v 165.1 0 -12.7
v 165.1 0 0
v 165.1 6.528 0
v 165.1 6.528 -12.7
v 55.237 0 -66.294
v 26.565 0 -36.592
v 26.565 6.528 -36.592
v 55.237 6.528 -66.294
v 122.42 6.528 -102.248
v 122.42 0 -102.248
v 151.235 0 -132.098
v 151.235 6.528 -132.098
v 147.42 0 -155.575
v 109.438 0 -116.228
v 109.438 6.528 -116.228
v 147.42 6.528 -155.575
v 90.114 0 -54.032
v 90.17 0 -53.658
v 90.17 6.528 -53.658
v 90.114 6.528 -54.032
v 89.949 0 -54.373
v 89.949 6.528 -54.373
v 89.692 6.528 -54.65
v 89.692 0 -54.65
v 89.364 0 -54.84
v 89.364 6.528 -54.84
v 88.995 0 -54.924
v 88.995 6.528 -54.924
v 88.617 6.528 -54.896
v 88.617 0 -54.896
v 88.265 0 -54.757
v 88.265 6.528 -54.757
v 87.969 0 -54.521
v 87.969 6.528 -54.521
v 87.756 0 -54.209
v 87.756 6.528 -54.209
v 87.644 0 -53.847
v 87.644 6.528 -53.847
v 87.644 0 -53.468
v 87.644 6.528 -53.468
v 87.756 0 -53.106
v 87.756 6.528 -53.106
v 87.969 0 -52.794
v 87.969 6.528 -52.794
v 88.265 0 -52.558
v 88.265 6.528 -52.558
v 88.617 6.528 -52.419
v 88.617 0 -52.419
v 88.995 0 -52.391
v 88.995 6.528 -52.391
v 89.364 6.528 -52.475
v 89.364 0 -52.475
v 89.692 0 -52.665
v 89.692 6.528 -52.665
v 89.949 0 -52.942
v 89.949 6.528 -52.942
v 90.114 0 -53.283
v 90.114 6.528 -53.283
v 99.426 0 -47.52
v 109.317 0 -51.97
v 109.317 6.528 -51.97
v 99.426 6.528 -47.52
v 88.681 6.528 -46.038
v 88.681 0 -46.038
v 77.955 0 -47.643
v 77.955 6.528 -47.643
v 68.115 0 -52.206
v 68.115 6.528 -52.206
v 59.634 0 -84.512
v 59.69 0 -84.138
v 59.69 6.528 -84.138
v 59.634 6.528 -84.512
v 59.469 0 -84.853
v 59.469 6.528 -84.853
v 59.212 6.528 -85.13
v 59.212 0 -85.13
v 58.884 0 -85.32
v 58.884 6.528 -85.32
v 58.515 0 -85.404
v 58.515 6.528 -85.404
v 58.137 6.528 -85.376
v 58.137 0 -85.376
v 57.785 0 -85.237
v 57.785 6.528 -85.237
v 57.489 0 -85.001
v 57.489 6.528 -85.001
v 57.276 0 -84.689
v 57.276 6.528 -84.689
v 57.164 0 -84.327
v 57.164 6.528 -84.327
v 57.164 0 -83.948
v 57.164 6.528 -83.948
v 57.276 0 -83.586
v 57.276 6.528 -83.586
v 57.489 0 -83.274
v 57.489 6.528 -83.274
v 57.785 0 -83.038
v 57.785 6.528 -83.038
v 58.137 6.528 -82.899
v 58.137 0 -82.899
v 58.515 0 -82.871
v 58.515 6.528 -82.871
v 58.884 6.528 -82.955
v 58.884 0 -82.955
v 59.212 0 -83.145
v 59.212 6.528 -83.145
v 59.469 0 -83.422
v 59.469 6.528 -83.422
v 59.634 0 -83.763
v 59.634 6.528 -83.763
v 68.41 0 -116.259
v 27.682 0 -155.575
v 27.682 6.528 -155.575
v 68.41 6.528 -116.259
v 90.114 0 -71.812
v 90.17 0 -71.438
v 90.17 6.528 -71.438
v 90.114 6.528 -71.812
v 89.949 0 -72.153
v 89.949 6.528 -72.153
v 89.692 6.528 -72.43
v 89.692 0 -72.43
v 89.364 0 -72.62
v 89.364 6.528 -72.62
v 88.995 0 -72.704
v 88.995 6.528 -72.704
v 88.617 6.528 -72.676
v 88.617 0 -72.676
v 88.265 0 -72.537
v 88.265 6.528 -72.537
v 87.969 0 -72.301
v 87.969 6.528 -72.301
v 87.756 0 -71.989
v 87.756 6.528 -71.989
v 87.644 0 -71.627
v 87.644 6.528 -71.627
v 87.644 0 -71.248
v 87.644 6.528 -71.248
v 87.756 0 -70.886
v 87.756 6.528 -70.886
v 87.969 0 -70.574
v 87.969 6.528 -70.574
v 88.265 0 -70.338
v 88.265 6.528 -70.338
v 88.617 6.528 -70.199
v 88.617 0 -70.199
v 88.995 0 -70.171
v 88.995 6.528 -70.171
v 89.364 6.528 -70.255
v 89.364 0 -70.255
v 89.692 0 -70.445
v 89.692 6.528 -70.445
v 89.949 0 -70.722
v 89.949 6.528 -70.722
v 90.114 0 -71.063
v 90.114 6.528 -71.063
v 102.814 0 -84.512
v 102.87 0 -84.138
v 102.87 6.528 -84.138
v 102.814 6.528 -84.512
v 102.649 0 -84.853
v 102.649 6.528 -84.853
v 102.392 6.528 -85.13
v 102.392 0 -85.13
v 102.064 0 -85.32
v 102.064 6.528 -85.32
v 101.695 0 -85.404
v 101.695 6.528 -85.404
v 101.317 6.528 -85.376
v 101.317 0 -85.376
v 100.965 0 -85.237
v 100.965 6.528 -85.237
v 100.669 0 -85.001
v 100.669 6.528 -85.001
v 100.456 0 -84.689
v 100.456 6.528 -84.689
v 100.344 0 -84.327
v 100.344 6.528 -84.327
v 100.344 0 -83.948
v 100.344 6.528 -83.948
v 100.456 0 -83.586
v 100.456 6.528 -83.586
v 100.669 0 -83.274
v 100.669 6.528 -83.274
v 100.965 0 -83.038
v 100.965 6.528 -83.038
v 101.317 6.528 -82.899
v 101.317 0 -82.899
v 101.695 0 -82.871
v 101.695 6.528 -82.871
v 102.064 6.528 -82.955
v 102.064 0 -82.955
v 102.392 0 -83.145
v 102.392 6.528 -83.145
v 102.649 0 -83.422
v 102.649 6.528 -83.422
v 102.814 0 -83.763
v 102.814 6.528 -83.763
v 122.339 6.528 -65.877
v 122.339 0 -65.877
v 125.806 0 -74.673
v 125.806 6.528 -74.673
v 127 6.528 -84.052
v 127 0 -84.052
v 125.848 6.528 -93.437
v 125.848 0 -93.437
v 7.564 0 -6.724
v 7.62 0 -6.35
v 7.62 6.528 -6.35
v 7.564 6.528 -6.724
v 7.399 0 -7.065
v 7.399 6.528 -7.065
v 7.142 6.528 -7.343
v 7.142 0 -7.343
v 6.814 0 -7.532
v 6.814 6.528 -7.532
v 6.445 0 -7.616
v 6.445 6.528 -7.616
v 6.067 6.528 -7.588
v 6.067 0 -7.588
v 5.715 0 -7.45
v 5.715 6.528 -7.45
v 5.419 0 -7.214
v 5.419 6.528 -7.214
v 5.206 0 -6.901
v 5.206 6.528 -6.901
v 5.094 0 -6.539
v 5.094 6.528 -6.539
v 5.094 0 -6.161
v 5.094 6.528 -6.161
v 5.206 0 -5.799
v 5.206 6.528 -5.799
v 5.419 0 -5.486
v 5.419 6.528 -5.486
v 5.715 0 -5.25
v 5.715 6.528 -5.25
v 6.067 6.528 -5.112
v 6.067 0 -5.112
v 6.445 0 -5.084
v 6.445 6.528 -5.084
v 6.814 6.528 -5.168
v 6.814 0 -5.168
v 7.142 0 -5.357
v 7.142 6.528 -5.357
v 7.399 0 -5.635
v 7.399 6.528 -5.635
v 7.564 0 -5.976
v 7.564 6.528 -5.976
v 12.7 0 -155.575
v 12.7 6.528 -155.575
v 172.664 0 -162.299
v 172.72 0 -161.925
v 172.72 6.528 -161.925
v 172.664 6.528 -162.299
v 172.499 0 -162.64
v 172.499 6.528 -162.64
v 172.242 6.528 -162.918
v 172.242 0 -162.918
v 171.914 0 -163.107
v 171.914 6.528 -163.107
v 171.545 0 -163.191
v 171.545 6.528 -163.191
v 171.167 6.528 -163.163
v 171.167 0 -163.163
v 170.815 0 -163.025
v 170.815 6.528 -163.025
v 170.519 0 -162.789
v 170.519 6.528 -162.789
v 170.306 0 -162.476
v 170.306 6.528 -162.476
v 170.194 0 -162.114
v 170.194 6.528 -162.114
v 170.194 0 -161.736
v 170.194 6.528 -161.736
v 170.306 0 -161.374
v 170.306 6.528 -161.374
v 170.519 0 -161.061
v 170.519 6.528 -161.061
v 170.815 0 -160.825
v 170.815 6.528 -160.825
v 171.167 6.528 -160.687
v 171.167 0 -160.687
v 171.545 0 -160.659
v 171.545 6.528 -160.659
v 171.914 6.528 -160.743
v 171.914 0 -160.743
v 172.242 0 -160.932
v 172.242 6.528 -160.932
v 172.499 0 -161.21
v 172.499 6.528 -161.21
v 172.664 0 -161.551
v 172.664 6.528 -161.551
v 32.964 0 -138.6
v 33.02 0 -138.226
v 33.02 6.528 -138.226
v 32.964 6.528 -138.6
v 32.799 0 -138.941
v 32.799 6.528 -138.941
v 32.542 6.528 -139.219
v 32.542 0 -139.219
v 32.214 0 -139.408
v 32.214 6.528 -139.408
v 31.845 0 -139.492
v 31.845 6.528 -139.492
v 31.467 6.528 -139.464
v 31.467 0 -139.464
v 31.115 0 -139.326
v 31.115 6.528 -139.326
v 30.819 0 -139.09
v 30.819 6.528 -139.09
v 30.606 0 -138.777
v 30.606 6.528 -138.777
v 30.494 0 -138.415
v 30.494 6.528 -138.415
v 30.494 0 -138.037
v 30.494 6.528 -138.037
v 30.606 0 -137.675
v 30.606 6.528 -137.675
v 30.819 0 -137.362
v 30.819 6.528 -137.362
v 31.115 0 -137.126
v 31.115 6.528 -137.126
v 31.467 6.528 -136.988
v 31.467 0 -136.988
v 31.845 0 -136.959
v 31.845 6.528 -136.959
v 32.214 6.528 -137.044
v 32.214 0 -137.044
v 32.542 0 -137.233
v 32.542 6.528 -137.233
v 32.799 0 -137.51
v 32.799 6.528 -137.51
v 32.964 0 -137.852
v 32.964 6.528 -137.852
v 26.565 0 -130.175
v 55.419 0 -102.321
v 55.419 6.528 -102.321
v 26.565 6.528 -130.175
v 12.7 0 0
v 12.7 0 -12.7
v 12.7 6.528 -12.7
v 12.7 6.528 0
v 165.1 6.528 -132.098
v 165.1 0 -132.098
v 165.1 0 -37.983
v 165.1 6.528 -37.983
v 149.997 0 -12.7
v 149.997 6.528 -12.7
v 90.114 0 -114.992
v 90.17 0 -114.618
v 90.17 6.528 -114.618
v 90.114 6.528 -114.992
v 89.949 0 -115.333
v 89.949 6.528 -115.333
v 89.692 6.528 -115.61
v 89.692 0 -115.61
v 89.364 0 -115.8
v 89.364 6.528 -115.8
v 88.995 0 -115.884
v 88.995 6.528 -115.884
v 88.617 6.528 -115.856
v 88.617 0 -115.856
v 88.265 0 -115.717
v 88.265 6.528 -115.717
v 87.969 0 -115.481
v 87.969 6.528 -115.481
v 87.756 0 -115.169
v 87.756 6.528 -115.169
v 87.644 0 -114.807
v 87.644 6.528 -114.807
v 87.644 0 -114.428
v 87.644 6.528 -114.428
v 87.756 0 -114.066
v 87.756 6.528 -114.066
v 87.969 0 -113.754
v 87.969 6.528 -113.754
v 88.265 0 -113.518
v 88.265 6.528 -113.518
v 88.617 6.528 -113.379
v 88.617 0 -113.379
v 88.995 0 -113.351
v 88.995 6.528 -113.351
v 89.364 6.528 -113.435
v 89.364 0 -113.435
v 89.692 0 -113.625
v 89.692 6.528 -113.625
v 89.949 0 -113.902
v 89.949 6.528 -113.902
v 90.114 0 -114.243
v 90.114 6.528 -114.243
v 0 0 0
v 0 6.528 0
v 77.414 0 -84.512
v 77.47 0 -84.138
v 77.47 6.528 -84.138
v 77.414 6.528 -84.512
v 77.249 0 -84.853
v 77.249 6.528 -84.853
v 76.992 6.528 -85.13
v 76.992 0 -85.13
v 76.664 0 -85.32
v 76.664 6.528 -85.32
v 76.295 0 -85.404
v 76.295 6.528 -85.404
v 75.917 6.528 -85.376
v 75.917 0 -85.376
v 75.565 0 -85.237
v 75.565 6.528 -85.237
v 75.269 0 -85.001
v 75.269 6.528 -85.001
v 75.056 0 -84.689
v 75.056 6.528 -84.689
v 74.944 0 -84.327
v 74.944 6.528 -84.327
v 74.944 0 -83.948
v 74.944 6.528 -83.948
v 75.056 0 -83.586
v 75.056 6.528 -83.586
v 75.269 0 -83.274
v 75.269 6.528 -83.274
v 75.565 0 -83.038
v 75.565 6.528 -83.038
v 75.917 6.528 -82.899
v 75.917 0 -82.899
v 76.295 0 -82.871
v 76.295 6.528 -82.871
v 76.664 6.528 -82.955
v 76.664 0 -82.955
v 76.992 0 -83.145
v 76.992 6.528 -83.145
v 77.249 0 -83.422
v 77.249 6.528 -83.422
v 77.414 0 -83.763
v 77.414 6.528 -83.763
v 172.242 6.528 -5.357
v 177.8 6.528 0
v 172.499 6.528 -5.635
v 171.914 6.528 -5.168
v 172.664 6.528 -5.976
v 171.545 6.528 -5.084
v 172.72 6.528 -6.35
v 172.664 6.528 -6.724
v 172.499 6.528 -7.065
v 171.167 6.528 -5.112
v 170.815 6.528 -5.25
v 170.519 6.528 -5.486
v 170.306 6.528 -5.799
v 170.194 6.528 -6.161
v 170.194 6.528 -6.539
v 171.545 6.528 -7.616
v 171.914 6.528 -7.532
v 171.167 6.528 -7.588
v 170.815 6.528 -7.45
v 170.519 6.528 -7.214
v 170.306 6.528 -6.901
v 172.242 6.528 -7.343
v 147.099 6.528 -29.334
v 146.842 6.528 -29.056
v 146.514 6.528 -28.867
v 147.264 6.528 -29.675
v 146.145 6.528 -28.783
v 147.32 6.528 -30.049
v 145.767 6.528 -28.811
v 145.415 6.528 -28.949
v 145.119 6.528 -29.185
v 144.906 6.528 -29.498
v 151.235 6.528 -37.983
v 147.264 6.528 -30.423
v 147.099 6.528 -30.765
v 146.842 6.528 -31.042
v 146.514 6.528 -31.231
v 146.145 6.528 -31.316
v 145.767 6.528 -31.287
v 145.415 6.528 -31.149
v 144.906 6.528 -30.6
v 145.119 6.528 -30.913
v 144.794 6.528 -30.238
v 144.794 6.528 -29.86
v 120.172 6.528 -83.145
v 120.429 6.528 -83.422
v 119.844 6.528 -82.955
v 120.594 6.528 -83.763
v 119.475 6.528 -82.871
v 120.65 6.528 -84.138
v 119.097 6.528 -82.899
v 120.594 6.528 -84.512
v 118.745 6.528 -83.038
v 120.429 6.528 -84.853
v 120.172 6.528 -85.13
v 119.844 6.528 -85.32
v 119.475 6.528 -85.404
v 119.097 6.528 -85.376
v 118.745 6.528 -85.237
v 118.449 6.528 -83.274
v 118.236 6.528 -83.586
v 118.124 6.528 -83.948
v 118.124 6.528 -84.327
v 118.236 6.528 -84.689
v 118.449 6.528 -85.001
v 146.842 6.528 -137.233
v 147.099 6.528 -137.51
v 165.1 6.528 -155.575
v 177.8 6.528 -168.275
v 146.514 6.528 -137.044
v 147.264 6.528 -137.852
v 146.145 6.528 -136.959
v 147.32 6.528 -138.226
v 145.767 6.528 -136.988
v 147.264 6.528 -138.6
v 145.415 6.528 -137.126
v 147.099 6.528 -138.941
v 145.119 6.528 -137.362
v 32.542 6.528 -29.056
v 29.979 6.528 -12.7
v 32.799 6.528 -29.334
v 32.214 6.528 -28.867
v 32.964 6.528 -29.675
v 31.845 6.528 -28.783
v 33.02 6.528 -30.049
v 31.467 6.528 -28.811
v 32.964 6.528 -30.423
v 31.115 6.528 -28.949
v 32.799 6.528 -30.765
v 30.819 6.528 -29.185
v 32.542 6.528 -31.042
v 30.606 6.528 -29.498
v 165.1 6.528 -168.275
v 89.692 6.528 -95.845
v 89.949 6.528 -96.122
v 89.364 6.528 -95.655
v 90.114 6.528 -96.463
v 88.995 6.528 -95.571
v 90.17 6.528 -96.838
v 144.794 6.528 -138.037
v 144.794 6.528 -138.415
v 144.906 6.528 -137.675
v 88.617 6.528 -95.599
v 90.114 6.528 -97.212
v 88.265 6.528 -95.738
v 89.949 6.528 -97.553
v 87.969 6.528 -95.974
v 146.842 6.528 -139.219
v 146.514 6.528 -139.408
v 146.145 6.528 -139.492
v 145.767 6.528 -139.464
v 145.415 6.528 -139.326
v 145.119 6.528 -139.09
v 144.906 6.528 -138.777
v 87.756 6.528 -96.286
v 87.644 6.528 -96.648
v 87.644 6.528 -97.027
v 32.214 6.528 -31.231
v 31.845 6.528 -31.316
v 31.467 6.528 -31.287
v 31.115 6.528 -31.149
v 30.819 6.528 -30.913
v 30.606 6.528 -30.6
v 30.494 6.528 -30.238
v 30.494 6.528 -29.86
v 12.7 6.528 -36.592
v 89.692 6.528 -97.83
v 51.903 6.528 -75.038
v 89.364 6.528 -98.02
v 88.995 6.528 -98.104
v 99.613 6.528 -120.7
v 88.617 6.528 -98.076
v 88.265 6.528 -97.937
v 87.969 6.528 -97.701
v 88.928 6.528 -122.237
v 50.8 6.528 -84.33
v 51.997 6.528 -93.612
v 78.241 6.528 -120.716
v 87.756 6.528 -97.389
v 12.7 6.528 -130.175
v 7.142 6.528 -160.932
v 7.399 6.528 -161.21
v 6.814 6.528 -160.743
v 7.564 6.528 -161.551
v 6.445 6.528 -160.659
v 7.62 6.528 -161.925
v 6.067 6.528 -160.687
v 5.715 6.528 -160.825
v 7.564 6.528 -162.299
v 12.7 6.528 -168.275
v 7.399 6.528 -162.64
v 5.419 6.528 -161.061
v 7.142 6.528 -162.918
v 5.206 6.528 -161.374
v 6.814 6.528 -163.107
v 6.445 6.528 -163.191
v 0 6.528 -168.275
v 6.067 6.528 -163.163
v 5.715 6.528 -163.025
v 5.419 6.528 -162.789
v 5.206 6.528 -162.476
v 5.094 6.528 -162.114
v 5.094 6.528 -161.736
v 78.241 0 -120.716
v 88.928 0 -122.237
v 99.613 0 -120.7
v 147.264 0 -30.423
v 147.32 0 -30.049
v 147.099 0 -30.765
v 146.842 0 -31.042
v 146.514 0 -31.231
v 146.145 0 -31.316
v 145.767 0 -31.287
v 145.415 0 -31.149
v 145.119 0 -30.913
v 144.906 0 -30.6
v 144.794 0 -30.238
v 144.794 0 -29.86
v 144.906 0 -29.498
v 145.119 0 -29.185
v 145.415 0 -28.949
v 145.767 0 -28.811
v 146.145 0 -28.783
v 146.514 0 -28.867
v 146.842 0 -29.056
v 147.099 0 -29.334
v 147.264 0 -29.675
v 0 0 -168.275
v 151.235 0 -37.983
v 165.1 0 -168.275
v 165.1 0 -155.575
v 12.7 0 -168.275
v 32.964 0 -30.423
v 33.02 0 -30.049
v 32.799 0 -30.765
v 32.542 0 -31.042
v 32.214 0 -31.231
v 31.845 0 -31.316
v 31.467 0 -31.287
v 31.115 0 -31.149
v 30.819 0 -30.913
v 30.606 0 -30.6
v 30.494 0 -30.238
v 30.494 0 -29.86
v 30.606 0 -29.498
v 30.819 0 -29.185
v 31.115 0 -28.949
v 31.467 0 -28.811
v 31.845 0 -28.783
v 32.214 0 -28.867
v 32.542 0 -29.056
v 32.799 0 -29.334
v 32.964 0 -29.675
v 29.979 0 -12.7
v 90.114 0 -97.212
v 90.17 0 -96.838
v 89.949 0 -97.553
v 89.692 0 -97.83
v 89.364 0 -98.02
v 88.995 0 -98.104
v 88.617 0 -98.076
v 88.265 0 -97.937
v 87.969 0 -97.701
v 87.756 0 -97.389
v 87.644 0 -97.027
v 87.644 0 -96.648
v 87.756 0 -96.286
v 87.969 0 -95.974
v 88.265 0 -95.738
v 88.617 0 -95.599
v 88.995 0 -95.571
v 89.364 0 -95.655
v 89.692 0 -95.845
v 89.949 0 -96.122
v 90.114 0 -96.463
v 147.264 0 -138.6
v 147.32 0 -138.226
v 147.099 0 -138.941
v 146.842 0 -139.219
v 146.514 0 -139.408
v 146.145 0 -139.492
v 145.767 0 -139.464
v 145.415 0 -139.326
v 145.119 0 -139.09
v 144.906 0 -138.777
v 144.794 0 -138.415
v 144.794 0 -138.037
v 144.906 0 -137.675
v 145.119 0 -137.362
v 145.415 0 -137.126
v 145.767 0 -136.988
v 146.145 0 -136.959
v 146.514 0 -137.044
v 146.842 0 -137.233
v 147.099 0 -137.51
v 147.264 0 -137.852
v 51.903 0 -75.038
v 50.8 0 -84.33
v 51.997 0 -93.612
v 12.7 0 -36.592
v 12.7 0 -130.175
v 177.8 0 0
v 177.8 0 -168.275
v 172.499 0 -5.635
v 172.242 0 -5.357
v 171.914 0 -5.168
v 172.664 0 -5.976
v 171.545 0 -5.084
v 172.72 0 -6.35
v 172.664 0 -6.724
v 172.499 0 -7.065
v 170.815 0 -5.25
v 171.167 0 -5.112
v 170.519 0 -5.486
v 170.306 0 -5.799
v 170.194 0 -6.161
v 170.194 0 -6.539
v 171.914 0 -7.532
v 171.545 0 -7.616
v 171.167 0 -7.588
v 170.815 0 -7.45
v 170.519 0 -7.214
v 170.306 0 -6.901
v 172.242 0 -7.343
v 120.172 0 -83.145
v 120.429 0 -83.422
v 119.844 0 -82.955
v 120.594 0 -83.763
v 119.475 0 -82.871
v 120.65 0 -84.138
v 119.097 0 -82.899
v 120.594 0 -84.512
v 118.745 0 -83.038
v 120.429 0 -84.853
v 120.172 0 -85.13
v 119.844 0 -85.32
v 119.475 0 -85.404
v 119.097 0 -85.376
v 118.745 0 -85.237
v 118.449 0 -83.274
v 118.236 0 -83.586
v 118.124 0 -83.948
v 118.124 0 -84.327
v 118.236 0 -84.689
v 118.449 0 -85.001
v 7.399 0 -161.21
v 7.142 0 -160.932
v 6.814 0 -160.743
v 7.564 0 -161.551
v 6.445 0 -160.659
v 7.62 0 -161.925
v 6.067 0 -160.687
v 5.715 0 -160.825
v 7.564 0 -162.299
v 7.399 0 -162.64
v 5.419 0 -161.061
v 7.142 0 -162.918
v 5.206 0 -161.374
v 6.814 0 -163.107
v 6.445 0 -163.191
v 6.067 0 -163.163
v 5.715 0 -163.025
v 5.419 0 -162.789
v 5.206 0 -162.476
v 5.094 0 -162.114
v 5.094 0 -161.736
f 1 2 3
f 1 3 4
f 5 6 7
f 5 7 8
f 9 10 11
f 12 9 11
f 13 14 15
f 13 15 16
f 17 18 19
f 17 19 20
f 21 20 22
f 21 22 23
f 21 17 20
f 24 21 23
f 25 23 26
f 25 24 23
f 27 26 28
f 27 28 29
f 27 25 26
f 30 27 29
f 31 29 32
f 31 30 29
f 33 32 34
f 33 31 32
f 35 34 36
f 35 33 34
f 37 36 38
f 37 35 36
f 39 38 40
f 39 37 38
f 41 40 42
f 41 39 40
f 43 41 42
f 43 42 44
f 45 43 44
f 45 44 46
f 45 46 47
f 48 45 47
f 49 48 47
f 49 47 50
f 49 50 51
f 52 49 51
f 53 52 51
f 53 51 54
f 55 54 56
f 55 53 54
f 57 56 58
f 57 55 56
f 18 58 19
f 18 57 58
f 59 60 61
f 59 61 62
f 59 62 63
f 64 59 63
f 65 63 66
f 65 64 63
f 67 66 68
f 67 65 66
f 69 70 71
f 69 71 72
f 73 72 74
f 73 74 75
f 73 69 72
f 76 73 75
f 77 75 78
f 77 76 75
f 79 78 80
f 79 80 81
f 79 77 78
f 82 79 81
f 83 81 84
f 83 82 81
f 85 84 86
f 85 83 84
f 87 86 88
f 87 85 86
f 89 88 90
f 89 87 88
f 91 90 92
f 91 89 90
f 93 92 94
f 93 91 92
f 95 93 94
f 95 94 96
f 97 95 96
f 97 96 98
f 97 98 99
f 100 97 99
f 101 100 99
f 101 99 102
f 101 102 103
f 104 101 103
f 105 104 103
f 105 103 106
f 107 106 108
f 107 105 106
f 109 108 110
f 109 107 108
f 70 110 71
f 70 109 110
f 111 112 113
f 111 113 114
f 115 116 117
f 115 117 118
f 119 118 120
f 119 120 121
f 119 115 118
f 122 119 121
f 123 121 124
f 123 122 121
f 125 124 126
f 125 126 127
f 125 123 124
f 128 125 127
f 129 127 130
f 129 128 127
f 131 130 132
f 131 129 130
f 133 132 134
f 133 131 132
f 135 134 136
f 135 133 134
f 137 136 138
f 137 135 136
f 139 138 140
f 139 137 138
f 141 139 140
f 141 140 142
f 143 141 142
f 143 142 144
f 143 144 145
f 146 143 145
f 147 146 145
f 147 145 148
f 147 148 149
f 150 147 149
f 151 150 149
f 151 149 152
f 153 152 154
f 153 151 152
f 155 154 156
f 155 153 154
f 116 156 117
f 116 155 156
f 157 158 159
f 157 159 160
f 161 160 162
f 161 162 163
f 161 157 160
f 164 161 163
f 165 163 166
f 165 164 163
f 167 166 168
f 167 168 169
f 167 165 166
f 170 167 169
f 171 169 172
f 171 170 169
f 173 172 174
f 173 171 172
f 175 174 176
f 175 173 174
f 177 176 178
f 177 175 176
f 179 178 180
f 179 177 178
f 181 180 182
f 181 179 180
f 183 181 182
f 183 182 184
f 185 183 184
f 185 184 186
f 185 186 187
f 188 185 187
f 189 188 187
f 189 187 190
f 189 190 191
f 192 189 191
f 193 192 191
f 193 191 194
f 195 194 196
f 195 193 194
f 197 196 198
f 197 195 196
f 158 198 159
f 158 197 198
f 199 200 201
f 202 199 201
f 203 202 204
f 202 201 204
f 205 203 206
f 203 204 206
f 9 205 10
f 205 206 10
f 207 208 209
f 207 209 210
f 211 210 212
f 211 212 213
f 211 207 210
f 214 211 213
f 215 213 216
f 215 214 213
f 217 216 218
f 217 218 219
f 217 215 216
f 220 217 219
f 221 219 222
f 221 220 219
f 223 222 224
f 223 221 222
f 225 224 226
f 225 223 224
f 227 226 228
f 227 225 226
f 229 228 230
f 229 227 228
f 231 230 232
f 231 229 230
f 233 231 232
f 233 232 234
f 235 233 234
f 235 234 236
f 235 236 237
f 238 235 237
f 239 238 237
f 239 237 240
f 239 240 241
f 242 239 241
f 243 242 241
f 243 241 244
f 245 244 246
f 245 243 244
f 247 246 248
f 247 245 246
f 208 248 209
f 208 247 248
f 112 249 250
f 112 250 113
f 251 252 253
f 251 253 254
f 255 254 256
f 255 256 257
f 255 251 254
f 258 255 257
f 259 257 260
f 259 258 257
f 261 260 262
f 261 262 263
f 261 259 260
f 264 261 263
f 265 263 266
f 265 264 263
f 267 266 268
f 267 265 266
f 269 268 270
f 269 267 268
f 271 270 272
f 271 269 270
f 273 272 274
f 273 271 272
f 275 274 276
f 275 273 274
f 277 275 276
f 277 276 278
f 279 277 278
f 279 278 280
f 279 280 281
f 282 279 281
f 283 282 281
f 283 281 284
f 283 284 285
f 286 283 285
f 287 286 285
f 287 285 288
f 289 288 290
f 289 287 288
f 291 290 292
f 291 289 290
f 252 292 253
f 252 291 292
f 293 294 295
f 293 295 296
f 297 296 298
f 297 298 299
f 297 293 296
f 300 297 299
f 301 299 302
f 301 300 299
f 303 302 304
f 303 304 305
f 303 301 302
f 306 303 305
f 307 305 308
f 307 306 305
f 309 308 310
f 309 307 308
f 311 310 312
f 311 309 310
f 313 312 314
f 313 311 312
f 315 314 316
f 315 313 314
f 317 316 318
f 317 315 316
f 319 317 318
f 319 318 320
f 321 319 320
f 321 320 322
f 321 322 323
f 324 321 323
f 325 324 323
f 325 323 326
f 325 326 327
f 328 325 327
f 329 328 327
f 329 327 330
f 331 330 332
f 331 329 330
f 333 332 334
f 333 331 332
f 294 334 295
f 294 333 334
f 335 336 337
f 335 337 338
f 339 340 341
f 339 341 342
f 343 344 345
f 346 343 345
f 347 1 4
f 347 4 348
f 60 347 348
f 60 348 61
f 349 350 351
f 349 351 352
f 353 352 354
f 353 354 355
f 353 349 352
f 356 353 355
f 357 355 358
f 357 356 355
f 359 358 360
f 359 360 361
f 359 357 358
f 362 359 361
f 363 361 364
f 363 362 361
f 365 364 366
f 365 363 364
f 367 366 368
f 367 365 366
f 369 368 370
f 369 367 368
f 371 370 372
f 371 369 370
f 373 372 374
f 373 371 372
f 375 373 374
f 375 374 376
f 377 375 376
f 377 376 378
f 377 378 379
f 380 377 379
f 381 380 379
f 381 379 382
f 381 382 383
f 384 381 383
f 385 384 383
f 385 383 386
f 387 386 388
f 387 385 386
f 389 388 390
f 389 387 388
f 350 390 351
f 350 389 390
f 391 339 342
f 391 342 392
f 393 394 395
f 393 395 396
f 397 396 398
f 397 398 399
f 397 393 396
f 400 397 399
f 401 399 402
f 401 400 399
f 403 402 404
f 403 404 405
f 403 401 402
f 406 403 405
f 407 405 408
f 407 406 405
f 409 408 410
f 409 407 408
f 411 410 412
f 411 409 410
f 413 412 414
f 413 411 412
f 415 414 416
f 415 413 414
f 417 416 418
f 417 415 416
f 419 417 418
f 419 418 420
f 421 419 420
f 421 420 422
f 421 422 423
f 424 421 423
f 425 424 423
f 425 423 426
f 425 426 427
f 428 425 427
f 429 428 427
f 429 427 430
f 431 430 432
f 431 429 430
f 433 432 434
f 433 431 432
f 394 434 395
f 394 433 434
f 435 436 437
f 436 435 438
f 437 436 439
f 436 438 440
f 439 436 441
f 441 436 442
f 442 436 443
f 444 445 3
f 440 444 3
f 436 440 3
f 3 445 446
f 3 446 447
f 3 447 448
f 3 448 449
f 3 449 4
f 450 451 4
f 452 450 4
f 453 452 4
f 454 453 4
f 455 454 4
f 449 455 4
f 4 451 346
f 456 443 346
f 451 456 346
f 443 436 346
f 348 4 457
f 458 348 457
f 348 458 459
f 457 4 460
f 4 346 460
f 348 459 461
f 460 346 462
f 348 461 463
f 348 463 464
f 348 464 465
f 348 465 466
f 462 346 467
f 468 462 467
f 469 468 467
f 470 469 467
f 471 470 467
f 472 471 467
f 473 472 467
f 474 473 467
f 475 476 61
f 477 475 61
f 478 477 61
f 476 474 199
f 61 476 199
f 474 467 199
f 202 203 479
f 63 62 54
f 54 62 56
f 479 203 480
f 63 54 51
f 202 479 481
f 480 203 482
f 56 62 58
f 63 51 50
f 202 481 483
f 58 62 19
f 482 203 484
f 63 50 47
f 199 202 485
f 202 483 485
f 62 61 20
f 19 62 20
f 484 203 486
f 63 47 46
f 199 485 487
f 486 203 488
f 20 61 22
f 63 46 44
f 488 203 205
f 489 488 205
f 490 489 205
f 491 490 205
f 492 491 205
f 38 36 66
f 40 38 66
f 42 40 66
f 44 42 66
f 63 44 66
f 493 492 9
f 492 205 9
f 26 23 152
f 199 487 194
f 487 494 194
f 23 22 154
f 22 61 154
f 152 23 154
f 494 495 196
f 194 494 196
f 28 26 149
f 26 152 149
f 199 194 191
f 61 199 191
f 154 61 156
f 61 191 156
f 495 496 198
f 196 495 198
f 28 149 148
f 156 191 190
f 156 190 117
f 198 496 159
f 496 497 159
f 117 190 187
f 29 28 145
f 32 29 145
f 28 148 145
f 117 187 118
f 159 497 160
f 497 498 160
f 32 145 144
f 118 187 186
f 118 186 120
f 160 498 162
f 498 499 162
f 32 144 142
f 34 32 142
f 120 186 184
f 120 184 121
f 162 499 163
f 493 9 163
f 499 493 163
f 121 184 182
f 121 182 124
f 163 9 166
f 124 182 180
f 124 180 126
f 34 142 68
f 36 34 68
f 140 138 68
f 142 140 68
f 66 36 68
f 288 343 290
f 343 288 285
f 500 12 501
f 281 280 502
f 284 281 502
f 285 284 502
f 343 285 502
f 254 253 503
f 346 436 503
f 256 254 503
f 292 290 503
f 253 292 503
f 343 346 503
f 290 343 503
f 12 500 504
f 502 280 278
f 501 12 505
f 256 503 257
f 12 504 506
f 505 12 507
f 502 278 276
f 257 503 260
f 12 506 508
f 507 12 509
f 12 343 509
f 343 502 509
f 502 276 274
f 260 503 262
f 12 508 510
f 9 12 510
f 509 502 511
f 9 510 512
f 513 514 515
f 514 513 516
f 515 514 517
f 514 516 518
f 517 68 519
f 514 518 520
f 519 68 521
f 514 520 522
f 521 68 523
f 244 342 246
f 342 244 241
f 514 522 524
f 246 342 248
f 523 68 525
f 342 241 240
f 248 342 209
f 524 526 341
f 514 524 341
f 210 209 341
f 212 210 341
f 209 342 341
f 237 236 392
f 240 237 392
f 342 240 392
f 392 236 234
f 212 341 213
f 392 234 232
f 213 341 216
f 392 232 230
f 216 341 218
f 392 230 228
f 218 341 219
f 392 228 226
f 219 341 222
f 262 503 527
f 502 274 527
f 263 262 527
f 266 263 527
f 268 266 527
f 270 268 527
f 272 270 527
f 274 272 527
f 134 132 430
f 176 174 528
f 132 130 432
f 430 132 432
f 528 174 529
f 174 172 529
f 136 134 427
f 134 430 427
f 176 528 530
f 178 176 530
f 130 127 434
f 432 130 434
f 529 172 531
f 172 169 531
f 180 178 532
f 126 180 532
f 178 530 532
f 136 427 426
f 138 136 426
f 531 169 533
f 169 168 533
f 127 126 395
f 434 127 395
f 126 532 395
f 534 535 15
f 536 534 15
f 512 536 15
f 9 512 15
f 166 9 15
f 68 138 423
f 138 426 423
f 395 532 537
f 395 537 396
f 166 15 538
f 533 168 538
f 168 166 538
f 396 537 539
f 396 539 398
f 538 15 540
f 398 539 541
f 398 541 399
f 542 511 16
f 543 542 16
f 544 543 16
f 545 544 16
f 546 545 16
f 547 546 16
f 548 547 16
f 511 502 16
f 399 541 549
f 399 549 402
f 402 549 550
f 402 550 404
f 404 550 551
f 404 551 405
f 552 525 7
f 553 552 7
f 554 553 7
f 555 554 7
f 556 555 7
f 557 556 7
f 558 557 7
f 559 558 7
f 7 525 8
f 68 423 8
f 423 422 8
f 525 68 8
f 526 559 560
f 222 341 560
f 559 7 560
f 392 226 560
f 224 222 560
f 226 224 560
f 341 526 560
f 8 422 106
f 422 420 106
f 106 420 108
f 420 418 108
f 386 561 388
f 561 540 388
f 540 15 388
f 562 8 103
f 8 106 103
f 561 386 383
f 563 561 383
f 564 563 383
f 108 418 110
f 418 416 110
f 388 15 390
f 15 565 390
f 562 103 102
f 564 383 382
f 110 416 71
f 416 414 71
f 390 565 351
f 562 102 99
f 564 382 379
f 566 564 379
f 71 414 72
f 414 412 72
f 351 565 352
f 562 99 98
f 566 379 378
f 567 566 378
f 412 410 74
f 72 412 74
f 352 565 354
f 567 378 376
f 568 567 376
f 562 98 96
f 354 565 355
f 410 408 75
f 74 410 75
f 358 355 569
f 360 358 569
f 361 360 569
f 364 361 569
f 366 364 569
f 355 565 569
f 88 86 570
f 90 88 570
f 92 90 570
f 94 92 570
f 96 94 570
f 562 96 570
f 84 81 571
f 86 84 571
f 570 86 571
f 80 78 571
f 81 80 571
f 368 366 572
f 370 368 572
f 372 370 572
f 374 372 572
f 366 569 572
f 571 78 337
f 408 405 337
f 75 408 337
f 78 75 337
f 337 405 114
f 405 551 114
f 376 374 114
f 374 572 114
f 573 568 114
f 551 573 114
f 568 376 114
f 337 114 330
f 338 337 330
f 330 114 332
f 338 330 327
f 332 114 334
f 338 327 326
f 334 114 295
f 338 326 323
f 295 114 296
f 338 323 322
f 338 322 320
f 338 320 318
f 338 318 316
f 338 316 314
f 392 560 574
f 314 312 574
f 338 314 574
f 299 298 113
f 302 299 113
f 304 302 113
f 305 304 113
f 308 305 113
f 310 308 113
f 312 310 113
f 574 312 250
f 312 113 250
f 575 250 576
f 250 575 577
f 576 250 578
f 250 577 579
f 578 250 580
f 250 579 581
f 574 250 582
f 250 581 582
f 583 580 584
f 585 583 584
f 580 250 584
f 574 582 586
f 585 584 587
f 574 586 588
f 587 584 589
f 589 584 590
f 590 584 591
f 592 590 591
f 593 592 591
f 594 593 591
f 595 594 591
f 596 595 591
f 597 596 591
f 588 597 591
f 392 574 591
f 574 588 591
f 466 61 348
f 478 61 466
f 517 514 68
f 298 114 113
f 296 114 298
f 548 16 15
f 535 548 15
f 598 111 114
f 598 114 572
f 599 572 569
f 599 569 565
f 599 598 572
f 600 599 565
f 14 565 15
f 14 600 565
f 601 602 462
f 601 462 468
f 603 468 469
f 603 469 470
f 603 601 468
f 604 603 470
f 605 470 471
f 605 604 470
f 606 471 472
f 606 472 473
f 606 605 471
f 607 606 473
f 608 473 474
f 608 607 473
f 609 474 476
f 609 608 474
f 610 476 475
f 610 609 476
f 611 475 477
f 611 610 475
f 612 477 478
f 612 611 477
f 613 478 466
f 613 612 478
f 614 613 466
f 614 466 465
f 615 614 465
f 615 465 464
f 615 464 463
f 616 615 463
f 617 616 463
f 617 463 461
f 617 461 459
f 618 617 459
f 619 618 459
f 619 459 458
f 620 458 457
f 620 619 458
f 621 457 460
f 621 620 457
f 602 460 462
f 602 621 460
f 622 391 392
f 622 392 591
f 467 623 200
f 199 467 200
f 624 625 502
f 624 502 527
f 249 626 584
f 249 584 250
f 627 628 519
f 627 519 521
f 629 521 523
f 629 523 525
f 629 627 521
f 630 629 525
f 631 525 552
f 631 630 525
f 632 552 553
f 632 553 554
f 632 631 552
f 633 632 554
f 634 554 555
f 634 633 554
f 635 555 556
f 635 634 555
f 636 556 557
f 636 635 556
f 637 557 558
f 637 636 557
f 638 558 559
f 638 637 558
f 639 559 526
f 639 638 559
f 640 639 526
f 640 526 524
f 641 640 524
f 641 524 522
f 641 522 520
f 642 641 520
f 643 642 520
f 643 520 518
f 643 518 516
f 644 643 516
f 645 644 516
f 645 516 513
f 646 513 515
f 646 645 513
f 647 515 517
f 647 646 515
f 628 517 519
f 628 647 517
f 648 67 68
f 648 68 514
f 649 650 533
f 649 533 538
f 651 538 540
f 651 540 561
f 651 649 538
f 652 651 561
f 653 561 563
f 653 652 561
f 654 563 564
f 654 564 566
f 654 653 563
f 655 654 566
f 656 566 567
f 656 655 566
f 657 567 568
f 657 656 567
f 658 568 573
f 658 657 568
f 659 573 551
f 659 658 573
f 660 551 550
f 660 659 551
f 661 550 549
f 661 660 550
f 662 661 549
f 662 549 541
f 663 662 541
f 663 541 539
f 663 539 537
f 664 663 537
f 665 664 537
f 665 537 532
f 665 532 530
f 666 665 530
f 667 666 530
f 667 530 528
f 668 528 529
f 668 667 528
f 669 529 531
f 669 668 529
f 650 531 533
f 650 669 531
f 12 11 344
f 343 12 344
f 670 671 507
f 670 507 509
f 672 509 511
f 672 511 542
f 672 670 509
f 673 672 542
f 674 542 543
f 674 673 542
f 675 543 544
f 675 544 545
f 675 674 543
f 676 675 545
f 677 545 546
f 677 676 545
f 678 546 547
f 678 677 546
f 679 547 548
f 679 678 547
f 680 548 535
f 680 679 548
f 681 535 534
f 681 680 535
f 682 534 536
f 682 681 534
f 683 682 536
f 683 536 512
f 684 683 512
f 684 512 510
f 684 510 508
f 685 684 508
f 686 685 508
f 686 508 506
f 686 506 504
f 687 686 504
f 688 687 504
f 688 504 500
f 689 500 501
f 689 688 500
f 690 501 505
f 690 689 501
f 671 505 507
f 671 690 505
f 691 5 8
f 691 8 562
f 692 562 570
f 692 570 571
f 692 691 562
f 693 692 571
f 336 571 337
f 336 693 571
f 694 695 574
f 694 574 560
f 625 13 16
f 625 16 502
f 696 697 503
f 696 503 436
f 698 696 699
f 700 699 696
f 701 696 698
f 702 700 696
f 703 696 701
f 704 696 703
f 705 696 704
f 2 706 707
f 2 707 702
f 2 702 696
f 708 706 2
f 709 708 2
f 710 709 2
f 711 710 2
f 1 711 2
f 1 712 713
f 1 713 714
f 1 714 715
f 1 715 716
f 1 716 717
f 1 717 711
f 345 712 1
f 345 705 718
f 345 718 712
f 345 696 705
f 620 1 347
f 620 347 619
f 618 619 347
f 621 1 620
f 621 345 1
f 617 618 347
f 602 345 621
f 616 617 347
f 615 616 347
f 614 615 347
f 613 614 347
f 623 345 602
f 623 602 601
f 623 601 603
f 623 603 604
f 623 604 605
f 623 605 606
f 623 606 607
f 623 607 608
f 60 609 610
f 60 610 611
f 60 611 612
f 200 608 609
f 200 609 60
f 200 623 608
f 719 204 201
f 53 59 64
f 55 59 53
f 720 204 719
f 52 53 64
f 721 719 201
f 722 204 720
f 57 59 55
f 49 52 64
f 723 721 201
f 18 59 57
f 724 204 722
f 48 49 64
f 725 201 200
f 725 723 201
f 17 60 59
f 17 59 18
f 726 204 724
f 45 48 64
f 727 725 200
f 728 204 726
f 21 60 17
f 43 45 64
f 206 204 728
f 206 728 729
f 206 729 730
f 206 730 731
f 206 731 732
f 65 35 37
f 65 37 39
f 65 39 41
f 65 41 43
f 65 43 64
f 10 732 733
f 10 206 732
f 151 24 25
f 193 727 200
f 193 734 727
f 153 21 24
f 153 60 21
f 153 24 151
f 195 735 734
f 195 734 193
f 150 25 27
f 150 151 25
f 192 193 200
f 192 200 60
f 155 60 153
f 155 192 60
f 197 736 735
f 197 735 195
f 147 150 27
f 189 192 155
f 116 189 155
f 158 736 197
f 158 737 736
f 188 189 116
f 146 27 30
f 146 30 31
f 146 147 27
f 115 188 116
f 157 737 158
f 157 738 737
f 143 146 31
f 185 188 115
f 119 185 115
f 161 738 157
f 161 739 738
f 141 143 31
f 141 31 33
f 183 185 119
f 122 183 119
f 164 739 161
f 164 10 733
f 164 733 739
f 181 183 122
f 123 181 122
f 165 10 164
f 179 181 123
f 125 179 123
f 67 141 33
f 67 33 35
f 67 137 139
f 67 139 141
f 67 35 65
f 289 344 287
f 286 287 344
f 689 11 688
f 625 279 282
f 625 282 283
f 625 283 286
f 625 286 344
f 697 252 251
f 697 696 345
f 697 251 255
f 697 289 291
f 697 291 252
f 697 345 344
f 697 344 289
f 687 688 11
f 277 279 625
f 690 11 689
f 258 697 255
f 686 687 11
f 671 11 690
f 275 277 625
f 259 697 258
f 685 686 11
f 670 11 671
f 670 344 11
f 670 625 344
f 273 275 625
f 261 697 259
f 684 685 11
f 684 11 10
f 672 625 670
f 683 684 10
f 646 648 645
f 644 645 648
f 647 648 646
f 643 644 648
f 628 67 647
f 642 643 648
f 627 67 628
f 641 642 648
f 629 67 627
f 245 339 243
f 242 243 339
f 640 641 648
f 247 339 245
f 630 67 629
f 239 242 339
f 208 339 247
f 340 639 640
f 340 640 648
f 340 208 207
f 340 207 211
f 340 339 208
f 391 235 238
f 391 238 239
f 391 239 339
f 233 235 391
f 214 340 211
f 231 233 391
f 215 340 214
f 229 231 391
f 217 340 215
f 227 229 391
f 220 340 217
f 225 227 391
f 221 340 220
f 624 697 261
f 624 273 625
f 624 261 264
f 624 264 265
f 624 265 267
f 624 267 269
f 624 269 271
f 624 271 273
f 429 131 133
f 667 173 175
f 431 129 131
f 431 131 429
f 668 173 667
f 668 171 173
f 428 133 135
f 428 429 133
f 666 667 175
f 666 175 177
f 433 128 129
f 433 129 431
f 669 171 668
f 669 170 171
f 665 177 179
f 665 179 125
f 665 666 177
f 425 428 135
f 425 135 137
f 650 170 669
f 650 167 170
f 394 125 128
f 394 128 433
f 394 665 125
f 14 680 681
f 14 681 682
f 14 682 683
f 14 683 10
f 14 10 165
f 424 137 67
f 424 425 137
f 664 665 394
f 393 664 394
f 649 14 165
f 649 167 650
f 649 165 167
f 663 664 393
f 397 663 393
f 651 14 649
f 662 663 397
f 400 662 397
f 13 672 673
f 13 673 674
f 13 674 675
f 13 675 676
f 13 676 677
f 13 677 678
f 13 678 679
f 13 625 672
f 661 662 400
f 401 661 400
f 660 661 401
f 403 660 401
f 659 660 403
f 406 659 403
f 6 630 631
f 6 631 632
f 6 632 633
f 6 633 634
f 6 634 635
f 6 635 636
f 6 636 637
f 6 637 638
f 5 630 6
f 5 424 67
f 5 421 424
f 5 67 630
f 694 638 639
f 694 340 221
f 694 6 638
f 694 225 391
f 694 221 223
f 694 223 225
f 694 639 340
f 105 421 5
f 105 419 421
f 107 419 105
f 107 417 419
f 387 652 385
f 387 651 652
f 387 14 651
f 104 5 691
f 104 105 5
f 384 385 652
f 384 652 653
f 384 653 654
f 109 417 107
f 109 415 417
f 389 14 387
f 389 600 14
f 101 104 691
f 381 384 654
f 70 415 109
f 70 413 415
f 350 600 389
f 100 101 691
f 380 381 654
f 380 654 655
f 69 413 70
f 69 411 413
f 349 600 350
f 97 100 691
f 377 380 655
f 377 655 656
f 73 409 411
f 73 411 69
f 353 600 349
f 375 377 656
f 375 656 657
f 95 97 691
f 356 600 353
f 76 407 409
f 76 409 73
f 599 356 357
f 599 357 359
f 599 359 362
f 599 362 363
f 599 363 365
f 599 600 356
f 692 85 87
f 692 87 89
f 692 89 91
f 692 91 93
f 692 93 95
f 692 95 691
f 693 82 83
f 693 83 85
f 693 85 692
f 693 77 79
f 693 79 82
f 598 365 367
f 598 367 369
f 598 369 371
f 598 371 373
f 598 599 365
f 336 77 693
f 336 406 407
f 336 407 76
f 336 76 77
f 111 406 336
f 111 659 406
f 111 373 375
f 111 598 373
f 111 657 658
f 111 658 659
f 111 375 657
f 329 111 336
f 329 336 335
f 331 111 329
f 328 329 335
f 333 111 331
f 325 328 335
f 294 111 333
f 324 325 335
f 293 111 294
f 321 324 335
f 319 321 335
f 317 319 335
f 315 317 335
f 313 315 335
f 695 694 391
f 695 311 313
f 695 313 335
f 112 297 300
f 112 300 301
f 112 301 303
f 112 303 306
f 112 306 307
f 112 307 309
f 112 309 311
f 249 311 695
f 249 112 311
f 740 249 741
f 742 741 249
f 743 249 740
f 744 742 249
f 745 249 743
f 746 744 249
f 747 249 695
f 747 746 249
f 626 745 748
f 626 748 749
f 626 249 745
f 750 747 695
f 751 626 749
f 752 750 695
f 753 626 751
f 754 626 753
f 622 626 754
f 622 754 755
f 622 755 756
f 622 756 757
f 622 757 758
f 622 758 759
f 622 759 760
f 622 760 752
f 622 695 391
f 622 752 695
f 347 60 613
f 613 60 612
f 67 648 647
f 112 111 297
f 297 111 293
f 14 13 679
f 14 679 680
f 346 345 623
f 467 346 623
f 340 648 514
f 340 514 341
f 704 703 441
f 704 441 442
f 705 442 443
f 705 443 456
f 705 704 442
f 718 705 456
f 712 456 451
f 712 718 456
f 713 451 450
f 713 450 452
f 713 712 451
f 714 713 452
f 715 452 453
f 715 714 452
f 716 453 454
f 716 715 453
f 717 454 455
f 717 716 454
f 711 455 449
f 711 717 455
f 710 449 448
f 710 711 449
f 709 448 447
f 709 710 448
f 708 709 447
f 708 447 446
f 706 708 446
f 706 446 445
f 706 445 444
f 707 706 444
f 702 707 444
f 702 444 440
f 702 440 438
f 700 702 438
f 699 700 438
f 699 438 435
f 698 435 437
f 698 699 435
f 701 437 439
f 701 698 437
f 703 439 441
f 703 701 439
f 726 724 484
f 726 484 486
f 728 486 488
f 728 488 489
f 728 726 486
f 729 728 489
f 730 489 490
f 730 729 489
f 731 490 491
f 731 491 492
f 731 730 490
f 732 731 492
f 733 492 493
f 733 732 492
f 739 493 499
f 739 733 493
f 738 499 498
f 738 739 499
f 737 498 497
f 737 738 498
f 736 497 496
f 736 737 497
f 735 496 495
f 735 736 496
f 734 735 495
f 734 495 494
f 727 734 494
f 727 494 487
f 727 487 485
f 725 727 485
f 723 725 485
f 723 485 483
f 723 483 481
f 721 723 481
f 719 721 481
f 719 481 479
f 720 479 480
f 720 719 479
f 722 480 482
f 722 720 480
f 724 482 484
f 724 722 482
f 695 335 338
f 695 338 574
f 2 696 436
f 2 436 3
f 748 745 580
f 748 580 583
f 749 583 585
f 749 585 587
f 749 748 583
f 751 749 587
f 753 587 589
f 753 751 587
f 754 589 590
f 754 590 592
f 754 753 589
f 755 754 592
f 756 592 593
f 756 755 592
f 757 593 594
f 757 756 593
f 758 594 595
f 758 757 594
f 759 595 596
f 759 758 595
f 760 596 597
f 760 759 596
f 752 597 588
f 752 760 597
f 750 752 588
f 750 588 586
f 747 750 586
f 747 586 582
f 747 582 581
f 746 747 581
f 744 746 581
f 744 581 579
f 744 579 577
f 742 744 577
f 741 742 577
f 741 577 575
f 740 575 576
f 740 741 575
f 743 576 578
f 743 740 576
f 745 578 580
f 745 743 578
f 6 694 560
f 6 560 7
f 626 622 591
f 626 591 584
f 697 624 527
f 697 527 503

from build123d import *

# Parameters (mm, degrees)
SKETCH1_R           = 1.27
BOSS_EXTRUDE1_DEPTH = 6.5278


with BuildPart() as part:
    # Sketch1 → Boss-Extrude1 (new body)
    with BuildSketch(Plane(origin=(0, 0, 0), x_dir=(1, 0, 0), z_dir=(0, 1, 0))):
        with BuildLine():
            Line((177.8, 0), (165.1, 0))
            Line((165.1, 0), (165.1, 12.7))
            Line((165.1, 12.7), (149.996873526, 12.7))
            Line((149.996873526, 12.7), (109.316778017, 51.969733907))
            ThreePointArc((109.316778017, 51.969733907), (88.681426877, 46.038126963), (68.115490096, 52.206102473))
            Line((68.115490096, 52.206102473), (29.979047387, 12.7))
            Line((29.979047387, 12.7), (12.7, 12.7))
            Line((12.7, 12.7), (12.7, 0))
            Line((12.7, 0), (0, 0))
            Line((0, 0), (0, 12.7))
            Line((0, 12.7), (0, 155.575))
            Line((0, 155.575), (0, 168.275))
            Line((0, 168.275), (12.7, 168.275))
            Line((12.7, 168.275), (12.7, 155.575))
            Line((12.7, 155.575), (27.681767073, 155.575))
            Line((27.681767073, 155.575), (68.410076297, 116.258723928))
            ThreePointArc((68.410076297, 116.258723928), (88.928296157, 122.237489492), (109.437612749, 116.228253537))
            Line((109.437612749, 116.228253537), (147.420224254, 155.575))
            Line((147.420224254, 155.575), (165.1, 155.575))
            Line((165.1, 155.575), (165.1, 168.275))
            Line((165.1, 168.275), (177.8, 168.275))
            Line((177.8, 168.275), (177.8, 155.575))
            Line((177.8, 155.575), (177.8, 12.7))
            Line((177.8, 12.7), (177.8, 0))
        make_face()
        with Locations((101.6, 84.1375)):
            Circle(SKETCH1_R, mode=Mode.SUBTRACT)
        with Locations((88.9, 71.4375)):
            Circle(SKETCH1_R, mode=Mode.SUBTRACT)
        with Locations((76.2, 84.1375)):
            Circle(SKETCH1_R, mode=Mode.SUBTRACT)
        with Locations((88.9, 96.8375)):
            Circle(SKETCH1_R, mode=Mode.SUBTRACT)
        with Locations((119.38, 84.1375)):
            Circle(SKETCH1_R, mode=Mode.SUBTRACT)
        with Locations((88.9, 53.6575)):
            Circle(SKETCH1_R, mode=Mode.SUBTRACT)
        with Locations((58.42, 84.1375)):
            Circle(SKETCH1_R, mode=Mode.SUBTRACT)
        with Locations((88.9, 114.6175)):
            Circle(SKETCH1_R, mode=Mode.SUBTRACT)
        with Locations((171.45, 161.925)):
            Circle(SKETCH1_R, mode=Mode.SUBTRACT)
        with Locations((171.45, 6.35)):
            Circle(SKETCH1_R, mode=Mode.SUBTRACT)
        with Locations((6.35, 6.35)):
            Circle(SKETCH1_R, mode=Mode.SUBTRACT)
        with Locations((6.35, 161.925)):
            Circle(SKETCH1_R, mode=Mode.SUBTRACT)
        with Locations((146.05, 138.225892857)):
            Circle(SKETCH1_R, mode=Mode.SUBTRACT)
        with Locations((146.05, 30.049107143)):
            Circle(SKETCH1_R, mode=Mode.SUBTRACT)
        with Locations((31.75, 30.049107143)):
            Circle(SKETCH1_R, mode=Mode.SUBTRACT)
        with Locations((31.75, 138.225892857)):
            Circle(SKETCH1_R, mode=Mode.SUBTRACT)
        with BuildLine():
            Line((165.1, 132.097774838), (165.1, 37.982848079))
            Line((165.1, 37.982848079), (151.23481924, 37.982848079))
            Line((151.23481924, 37.982848079), (122.338925223, 65.876933745))
            ThreePointArc((122.338925223, 65.876933745), (126.999904752, 84.052306631), (122.420253584, 102.248342047))
            Line((122.420253584, 102.248342047), (151.23481924, 132.097774838))
            Line((151.23481924, 132.097774838), (165.1, 132.097774838))
        make_face(mode=Mode.SUBTRACT)
        with BuildLine():
            Line((12.7, 130.175), (12.7, 36.592345569))
            Line((12.7, 36.592345569), (26.56518076, 36.592345569))
            Line((26.56518076, 36.592345569), (55.23682207, 66.293720925))
            ThreePointArc((55.23682207, 66.293720925), (50.800488469, 84.330427734), (55.41925789, 102.321281448))
            Line((55.41925789, 102.321281448), (26.56518076, 130.175))
            Line((26.56518076, 130.175), (12.7, 130.175))
        make_face(mode=Mode.SUBTRACT)
    extrude(amount=BOSS_EXTRUDE1_DEPTH)


solid = part.part
